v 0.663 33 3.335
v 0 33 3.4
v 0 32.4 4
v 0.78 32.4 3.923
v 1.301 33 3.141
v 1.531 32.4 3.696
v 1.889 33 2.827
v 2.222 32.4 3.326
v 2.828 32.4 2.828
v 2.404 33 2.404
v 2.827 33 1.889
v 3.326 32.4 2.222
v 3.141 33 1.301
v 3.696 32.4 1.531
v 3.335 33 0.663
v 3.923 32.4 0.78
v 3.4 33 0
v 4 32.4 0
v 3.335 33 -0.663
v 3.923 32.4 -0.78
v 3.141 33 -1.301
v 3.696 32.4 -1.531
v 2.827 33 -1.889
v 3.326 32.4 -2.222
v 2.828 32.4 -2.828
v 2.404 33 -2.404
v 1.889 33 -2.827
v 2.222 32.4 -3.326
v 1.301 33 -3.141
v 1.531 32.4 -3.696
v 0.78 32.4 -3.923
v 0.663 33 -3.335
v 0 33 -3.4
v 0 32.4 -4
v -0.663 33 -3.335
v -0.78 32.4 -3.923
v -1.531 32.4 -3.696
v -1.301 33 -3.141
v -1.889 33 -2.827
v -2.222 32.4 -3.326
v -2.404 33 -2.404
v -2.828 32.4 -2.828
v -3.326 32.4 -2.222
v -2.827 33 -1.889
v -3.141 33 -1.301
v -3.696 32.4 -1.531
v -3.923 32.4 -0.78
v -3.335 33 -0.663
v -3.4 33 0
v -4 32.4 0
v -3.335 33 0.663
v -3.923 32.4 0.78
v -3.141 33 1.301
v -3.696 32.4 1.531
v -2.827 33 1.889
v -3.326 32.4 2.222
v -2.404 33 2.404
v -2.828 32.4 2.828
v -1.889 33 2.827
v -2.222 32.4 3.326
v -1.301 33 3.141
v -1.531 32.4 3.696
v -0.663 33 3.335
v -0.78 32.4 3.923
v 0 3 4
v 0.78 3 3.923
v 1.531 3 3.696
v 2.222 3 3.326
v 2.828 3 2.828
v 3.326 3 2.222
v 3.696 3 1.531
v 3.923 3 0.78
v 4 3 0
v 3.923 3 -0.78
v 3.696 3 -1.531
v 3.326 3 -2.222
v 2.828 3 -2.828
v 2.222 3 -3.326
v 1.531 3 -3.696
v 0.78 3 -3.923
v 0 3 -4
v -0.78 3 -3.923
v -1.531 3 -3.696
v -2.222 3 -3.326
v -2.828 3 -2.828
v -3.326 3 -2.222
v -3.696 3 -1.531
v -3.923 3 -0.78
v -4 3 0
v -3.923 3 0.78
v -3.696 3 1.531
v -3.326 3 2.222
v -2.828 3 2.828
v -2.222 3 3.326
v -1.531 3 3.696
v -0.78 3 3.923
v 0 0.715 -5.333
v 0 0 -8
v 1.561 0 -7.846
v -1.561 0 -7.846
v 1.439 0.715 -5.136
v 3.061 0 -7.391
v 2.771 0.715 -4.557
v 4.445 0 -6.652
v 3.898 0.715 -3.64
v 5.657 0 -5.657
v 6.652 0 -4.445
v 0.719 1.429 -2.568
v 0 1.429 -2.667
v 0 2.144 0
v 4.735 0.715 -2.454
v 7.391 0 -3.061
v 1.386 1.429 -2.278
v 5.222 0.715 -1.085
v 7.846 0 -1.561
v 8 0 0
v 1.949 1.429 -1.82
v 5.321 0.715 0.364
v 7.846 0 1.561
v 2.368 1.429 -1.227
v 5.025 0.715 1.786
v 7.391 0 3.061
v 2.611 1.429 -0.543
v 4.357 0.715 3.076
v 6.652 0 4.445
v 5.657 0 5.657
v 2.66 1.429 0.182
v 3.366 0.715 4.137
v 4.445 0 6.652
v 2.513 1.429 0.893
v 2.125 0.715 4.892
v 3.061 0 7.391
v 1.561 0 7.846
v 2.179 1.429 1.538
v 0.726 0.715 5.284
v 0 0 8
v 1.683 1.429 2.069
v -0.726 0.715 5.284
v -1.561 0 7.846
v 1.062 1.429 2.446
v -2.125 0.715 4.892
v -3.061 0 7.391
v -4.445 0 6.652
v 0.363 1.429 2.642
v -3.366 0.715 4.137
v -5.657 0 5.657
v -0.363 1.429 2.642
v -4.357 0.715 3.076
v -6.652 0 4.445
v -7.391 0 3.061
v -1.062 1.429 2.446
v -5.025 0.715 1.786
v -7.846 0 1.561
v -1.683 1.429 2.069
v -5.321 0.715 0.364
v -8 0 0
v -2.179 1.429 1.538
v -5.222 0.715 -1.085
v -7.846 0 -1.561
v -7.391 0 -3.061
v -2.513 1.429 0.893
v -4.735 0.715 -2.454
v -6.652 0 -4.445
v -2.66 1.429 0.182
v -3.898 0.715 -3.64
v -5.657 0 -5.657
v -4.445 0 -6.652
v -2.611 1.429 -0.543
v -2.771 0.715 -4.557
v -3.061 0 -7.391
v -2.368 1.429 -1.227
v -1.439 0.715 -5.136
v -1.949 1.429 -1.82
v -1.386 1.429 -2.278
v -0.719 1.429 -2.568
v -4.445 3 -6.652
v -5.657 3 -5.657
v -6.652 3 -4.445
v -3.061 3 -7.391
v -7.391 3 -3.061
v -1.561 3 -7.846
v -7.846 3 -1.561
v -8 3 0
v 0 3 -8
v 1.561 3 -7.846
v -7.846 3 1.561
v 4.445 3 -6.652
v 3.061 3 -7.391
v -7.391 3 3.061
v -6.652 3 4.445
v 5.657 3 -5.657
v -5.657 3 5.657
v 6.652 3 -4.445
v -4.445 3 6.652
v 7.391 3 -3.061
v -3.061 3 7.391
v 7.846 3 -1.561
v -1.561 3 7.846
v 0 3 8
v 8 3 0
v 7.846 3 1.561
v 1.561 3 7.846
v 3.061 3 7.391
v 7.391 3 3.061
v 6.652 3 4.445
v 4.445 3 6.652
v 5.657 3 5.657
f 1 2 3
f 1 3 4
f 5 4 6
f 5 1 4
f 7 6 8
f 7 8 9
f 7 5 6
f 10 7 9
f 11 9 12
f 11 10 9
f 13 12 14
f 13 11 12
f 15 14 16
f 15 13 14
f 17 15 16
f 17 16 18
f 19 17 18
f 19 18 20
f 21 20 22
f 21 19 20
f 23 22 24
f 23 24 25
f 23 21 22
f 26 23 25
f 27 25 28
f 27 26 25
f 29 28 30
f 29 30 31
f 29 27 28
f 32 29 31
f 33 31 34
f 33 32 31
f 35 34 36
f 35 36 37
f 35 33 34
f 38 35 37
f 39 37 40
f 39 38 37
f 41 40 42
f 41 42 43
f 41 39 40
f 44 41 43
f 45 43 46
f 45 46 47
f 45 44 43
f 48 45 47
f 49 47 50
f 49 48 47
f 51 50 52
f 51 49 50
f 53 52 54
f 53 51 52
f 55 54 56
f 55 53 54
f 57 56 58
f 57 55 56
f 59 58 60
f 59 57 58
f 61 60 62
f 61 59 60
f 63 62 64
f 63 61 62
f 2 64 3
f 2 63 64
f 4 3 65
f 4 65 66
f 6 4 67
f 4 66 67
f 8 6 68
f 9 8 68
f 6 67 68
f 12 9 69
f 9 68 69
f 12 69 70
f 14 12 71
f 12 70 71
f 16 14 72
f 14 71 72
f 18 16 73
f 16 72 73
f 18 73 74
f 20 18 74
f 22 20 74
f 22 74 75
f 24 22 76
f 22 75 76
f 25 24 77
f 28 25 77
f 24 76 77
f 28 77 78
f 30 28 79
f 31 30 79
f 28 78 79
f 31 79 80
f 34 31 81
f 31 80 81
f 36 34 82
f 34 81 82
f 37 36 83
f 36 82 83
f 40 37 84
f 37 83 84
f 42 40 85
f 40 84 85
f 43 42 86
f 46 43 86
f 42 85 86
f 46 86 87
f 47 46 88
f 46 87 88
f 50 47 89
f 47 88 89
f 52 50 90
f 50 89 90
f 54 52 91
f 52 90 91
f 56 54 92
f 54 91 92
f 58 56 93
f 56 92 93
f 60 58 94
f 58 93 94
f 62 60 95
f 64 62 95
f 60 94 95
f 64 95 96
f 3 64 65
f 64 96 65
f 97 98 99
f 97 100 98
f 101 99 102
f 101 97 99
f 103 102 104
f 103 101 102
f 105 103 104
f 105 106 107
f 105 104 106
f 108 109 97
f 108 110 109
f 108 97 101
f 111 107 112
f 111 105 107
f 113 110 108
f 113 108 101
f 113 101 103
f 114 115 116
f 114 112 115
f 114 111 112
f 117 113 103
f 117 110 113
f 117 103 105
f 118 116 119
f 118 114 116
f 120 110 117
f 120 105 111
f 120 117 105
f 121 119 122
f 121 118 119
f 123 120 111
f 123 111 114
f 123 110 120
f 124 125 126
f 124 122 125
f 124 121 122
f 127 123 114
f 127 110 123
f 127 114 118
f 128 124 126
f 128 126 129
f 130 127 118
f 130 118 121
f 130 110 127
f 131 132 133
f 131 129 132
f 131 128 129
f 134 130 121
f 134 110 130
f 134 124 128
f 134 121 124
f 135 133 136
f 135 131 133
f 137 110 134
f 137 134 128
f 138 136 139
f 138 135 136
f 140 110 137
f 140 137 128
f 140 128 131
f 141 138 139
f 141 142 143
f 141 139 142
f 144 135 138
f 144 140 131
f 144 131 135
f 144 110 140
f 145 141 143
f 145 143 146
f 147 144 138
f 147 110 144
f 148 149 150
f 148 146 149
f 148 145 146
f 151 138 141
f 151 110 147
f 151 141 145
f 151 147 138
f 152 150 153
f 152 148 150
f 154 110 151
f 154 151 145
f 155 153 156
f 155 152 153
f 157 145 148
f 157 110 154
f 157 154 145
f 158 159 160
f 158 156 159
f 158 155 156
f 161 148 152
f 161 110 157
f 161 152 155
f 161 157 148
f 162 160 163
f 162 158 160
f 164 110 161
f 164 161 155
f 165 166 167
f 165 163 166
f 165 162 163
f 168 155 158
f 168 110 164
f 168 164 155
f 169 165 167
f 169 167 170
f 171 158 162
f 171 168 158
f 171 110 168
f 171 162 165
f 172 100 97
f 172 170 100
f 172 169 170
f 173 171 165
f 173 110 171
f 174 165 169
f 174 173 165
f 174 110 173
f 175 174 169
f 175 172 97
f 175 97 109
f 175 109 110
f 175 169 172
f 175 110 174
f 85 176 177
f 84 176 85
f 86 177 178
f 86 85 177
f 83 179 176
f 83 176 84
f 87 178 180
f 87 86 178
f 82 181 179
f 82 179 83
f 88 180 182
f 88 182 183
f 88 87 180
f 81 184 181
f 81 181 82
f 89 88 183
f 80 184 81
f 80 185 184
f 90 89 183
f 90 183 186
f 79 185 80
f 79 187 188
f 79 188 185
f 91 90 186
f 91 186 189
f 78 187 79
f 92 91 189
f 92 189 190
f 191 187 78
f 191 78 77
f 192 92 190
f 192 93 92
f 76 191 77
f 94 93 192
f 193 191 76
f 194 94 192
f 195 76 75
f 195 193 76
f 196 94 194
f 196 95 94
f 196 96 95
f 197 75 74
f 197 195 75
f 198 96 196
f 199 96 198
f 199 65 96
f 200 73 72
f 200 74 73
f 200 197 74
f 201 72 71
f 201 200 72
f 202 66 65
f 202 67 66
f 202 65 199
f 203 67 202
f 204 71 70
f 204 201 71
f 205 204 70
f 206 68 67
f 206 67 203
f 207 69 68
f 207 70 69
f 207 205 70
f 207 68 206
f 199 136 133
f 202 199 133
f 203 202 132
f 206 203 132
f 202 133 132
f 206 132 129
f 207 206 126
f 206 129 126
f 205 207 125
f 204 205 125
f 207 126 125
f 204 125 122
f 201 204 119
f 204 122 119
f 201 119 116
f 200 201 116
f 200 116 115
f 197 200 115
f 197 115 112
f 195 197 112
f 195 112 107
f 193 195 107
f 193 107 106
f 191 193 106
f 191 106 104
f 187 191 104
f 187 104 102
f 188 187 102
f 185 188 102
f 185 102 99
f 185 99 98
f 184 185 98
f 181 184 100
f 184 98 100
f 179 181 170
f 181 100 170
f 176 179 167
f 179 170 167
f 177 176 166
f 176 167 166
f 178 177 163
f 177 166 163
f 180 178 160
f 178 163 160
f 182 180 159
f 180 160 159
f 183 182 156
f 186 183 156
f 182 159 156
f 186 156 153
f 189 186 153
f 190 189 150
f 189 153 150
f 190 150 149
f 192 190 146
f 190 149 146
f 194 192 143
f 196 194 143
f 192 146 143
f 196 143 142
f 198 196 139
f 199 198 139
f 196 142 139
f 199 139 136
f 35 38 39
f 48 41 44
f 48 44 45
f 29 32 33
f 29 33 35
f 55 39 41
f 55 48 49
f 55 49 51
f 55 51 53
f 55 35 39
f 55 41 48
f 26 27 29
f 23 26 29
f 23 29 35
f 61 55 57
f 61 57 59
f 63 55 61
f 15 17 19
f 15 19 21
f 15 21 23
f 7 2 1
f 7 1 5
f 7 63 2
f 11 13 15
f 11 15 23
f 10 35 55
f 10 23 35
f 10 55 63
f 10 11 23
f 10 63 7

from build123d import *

# Parameters (mm, degrees)
SKETCH_1_R      = 8
EXTRUDE_1_DEPTH = 3
SKETCH_2_R      = 4
EXTRUDE_2_DEPTH = 30
CHAMFER_1_SIZE  = 0.6


with BuildPart() as part:
    # Эскиз1 → Бобышка-Вытянуть1 (new body)
    with BuildSketch(Plane(origin=(0, 0, 0), x_dir=(1, 0, 0), z_dir=(0, 1, 0))):
        with Locations(Location((0, 0, 0), (0, 0, 270))):
            Circle(SKETCH_1_R)
    extrude(amount=EXTRUDE_1_DEPTH)

    # Эскиз2 → Бобышка-Вытянуть2 (add)
    with BuildSketch(Plane(origin=(0, 3, 0), x_dir=(1, 0, 0), z_dir=(0, 1, 0))):
        with Locations(Location((0, 0, 0), (0, 0, 270))):
            Circle(SKETCH_2_R)
    extrude(amount=EXTRUDE_2_DEPTH)

    # Эскиз3 → Вырез-Повернуть1 (revolve, cut)
    with BuildSketch(Plane(origin=(0, 0, 0), x_dir=(0, 0, -1), z_dir=(1, 0, 0)), mode=Mode.PRIVATE) as cut_revolve_1_sk:
        Polygon((-8, 0), (0, 2.143593539), (0, 0), align=None)
    revolve(cut_revolve_1_sk.sketch.rotate(Axis((0, 2.143593539, 0), (0, -1, 0)), 180), axis=Axis((0, 2.143593539, 0), (0, -1, 0)), mode=Mode.SUBTRACT)

    # Фаска1
    chamfer_1_edges = [part.edges().sort_by_distance(p)[0] for p in [
        (0, 33, -4),
    ]]
    chamfer(chamfer_1_edges, length=CHAMFER_1_SIZE)


solid = part.part
